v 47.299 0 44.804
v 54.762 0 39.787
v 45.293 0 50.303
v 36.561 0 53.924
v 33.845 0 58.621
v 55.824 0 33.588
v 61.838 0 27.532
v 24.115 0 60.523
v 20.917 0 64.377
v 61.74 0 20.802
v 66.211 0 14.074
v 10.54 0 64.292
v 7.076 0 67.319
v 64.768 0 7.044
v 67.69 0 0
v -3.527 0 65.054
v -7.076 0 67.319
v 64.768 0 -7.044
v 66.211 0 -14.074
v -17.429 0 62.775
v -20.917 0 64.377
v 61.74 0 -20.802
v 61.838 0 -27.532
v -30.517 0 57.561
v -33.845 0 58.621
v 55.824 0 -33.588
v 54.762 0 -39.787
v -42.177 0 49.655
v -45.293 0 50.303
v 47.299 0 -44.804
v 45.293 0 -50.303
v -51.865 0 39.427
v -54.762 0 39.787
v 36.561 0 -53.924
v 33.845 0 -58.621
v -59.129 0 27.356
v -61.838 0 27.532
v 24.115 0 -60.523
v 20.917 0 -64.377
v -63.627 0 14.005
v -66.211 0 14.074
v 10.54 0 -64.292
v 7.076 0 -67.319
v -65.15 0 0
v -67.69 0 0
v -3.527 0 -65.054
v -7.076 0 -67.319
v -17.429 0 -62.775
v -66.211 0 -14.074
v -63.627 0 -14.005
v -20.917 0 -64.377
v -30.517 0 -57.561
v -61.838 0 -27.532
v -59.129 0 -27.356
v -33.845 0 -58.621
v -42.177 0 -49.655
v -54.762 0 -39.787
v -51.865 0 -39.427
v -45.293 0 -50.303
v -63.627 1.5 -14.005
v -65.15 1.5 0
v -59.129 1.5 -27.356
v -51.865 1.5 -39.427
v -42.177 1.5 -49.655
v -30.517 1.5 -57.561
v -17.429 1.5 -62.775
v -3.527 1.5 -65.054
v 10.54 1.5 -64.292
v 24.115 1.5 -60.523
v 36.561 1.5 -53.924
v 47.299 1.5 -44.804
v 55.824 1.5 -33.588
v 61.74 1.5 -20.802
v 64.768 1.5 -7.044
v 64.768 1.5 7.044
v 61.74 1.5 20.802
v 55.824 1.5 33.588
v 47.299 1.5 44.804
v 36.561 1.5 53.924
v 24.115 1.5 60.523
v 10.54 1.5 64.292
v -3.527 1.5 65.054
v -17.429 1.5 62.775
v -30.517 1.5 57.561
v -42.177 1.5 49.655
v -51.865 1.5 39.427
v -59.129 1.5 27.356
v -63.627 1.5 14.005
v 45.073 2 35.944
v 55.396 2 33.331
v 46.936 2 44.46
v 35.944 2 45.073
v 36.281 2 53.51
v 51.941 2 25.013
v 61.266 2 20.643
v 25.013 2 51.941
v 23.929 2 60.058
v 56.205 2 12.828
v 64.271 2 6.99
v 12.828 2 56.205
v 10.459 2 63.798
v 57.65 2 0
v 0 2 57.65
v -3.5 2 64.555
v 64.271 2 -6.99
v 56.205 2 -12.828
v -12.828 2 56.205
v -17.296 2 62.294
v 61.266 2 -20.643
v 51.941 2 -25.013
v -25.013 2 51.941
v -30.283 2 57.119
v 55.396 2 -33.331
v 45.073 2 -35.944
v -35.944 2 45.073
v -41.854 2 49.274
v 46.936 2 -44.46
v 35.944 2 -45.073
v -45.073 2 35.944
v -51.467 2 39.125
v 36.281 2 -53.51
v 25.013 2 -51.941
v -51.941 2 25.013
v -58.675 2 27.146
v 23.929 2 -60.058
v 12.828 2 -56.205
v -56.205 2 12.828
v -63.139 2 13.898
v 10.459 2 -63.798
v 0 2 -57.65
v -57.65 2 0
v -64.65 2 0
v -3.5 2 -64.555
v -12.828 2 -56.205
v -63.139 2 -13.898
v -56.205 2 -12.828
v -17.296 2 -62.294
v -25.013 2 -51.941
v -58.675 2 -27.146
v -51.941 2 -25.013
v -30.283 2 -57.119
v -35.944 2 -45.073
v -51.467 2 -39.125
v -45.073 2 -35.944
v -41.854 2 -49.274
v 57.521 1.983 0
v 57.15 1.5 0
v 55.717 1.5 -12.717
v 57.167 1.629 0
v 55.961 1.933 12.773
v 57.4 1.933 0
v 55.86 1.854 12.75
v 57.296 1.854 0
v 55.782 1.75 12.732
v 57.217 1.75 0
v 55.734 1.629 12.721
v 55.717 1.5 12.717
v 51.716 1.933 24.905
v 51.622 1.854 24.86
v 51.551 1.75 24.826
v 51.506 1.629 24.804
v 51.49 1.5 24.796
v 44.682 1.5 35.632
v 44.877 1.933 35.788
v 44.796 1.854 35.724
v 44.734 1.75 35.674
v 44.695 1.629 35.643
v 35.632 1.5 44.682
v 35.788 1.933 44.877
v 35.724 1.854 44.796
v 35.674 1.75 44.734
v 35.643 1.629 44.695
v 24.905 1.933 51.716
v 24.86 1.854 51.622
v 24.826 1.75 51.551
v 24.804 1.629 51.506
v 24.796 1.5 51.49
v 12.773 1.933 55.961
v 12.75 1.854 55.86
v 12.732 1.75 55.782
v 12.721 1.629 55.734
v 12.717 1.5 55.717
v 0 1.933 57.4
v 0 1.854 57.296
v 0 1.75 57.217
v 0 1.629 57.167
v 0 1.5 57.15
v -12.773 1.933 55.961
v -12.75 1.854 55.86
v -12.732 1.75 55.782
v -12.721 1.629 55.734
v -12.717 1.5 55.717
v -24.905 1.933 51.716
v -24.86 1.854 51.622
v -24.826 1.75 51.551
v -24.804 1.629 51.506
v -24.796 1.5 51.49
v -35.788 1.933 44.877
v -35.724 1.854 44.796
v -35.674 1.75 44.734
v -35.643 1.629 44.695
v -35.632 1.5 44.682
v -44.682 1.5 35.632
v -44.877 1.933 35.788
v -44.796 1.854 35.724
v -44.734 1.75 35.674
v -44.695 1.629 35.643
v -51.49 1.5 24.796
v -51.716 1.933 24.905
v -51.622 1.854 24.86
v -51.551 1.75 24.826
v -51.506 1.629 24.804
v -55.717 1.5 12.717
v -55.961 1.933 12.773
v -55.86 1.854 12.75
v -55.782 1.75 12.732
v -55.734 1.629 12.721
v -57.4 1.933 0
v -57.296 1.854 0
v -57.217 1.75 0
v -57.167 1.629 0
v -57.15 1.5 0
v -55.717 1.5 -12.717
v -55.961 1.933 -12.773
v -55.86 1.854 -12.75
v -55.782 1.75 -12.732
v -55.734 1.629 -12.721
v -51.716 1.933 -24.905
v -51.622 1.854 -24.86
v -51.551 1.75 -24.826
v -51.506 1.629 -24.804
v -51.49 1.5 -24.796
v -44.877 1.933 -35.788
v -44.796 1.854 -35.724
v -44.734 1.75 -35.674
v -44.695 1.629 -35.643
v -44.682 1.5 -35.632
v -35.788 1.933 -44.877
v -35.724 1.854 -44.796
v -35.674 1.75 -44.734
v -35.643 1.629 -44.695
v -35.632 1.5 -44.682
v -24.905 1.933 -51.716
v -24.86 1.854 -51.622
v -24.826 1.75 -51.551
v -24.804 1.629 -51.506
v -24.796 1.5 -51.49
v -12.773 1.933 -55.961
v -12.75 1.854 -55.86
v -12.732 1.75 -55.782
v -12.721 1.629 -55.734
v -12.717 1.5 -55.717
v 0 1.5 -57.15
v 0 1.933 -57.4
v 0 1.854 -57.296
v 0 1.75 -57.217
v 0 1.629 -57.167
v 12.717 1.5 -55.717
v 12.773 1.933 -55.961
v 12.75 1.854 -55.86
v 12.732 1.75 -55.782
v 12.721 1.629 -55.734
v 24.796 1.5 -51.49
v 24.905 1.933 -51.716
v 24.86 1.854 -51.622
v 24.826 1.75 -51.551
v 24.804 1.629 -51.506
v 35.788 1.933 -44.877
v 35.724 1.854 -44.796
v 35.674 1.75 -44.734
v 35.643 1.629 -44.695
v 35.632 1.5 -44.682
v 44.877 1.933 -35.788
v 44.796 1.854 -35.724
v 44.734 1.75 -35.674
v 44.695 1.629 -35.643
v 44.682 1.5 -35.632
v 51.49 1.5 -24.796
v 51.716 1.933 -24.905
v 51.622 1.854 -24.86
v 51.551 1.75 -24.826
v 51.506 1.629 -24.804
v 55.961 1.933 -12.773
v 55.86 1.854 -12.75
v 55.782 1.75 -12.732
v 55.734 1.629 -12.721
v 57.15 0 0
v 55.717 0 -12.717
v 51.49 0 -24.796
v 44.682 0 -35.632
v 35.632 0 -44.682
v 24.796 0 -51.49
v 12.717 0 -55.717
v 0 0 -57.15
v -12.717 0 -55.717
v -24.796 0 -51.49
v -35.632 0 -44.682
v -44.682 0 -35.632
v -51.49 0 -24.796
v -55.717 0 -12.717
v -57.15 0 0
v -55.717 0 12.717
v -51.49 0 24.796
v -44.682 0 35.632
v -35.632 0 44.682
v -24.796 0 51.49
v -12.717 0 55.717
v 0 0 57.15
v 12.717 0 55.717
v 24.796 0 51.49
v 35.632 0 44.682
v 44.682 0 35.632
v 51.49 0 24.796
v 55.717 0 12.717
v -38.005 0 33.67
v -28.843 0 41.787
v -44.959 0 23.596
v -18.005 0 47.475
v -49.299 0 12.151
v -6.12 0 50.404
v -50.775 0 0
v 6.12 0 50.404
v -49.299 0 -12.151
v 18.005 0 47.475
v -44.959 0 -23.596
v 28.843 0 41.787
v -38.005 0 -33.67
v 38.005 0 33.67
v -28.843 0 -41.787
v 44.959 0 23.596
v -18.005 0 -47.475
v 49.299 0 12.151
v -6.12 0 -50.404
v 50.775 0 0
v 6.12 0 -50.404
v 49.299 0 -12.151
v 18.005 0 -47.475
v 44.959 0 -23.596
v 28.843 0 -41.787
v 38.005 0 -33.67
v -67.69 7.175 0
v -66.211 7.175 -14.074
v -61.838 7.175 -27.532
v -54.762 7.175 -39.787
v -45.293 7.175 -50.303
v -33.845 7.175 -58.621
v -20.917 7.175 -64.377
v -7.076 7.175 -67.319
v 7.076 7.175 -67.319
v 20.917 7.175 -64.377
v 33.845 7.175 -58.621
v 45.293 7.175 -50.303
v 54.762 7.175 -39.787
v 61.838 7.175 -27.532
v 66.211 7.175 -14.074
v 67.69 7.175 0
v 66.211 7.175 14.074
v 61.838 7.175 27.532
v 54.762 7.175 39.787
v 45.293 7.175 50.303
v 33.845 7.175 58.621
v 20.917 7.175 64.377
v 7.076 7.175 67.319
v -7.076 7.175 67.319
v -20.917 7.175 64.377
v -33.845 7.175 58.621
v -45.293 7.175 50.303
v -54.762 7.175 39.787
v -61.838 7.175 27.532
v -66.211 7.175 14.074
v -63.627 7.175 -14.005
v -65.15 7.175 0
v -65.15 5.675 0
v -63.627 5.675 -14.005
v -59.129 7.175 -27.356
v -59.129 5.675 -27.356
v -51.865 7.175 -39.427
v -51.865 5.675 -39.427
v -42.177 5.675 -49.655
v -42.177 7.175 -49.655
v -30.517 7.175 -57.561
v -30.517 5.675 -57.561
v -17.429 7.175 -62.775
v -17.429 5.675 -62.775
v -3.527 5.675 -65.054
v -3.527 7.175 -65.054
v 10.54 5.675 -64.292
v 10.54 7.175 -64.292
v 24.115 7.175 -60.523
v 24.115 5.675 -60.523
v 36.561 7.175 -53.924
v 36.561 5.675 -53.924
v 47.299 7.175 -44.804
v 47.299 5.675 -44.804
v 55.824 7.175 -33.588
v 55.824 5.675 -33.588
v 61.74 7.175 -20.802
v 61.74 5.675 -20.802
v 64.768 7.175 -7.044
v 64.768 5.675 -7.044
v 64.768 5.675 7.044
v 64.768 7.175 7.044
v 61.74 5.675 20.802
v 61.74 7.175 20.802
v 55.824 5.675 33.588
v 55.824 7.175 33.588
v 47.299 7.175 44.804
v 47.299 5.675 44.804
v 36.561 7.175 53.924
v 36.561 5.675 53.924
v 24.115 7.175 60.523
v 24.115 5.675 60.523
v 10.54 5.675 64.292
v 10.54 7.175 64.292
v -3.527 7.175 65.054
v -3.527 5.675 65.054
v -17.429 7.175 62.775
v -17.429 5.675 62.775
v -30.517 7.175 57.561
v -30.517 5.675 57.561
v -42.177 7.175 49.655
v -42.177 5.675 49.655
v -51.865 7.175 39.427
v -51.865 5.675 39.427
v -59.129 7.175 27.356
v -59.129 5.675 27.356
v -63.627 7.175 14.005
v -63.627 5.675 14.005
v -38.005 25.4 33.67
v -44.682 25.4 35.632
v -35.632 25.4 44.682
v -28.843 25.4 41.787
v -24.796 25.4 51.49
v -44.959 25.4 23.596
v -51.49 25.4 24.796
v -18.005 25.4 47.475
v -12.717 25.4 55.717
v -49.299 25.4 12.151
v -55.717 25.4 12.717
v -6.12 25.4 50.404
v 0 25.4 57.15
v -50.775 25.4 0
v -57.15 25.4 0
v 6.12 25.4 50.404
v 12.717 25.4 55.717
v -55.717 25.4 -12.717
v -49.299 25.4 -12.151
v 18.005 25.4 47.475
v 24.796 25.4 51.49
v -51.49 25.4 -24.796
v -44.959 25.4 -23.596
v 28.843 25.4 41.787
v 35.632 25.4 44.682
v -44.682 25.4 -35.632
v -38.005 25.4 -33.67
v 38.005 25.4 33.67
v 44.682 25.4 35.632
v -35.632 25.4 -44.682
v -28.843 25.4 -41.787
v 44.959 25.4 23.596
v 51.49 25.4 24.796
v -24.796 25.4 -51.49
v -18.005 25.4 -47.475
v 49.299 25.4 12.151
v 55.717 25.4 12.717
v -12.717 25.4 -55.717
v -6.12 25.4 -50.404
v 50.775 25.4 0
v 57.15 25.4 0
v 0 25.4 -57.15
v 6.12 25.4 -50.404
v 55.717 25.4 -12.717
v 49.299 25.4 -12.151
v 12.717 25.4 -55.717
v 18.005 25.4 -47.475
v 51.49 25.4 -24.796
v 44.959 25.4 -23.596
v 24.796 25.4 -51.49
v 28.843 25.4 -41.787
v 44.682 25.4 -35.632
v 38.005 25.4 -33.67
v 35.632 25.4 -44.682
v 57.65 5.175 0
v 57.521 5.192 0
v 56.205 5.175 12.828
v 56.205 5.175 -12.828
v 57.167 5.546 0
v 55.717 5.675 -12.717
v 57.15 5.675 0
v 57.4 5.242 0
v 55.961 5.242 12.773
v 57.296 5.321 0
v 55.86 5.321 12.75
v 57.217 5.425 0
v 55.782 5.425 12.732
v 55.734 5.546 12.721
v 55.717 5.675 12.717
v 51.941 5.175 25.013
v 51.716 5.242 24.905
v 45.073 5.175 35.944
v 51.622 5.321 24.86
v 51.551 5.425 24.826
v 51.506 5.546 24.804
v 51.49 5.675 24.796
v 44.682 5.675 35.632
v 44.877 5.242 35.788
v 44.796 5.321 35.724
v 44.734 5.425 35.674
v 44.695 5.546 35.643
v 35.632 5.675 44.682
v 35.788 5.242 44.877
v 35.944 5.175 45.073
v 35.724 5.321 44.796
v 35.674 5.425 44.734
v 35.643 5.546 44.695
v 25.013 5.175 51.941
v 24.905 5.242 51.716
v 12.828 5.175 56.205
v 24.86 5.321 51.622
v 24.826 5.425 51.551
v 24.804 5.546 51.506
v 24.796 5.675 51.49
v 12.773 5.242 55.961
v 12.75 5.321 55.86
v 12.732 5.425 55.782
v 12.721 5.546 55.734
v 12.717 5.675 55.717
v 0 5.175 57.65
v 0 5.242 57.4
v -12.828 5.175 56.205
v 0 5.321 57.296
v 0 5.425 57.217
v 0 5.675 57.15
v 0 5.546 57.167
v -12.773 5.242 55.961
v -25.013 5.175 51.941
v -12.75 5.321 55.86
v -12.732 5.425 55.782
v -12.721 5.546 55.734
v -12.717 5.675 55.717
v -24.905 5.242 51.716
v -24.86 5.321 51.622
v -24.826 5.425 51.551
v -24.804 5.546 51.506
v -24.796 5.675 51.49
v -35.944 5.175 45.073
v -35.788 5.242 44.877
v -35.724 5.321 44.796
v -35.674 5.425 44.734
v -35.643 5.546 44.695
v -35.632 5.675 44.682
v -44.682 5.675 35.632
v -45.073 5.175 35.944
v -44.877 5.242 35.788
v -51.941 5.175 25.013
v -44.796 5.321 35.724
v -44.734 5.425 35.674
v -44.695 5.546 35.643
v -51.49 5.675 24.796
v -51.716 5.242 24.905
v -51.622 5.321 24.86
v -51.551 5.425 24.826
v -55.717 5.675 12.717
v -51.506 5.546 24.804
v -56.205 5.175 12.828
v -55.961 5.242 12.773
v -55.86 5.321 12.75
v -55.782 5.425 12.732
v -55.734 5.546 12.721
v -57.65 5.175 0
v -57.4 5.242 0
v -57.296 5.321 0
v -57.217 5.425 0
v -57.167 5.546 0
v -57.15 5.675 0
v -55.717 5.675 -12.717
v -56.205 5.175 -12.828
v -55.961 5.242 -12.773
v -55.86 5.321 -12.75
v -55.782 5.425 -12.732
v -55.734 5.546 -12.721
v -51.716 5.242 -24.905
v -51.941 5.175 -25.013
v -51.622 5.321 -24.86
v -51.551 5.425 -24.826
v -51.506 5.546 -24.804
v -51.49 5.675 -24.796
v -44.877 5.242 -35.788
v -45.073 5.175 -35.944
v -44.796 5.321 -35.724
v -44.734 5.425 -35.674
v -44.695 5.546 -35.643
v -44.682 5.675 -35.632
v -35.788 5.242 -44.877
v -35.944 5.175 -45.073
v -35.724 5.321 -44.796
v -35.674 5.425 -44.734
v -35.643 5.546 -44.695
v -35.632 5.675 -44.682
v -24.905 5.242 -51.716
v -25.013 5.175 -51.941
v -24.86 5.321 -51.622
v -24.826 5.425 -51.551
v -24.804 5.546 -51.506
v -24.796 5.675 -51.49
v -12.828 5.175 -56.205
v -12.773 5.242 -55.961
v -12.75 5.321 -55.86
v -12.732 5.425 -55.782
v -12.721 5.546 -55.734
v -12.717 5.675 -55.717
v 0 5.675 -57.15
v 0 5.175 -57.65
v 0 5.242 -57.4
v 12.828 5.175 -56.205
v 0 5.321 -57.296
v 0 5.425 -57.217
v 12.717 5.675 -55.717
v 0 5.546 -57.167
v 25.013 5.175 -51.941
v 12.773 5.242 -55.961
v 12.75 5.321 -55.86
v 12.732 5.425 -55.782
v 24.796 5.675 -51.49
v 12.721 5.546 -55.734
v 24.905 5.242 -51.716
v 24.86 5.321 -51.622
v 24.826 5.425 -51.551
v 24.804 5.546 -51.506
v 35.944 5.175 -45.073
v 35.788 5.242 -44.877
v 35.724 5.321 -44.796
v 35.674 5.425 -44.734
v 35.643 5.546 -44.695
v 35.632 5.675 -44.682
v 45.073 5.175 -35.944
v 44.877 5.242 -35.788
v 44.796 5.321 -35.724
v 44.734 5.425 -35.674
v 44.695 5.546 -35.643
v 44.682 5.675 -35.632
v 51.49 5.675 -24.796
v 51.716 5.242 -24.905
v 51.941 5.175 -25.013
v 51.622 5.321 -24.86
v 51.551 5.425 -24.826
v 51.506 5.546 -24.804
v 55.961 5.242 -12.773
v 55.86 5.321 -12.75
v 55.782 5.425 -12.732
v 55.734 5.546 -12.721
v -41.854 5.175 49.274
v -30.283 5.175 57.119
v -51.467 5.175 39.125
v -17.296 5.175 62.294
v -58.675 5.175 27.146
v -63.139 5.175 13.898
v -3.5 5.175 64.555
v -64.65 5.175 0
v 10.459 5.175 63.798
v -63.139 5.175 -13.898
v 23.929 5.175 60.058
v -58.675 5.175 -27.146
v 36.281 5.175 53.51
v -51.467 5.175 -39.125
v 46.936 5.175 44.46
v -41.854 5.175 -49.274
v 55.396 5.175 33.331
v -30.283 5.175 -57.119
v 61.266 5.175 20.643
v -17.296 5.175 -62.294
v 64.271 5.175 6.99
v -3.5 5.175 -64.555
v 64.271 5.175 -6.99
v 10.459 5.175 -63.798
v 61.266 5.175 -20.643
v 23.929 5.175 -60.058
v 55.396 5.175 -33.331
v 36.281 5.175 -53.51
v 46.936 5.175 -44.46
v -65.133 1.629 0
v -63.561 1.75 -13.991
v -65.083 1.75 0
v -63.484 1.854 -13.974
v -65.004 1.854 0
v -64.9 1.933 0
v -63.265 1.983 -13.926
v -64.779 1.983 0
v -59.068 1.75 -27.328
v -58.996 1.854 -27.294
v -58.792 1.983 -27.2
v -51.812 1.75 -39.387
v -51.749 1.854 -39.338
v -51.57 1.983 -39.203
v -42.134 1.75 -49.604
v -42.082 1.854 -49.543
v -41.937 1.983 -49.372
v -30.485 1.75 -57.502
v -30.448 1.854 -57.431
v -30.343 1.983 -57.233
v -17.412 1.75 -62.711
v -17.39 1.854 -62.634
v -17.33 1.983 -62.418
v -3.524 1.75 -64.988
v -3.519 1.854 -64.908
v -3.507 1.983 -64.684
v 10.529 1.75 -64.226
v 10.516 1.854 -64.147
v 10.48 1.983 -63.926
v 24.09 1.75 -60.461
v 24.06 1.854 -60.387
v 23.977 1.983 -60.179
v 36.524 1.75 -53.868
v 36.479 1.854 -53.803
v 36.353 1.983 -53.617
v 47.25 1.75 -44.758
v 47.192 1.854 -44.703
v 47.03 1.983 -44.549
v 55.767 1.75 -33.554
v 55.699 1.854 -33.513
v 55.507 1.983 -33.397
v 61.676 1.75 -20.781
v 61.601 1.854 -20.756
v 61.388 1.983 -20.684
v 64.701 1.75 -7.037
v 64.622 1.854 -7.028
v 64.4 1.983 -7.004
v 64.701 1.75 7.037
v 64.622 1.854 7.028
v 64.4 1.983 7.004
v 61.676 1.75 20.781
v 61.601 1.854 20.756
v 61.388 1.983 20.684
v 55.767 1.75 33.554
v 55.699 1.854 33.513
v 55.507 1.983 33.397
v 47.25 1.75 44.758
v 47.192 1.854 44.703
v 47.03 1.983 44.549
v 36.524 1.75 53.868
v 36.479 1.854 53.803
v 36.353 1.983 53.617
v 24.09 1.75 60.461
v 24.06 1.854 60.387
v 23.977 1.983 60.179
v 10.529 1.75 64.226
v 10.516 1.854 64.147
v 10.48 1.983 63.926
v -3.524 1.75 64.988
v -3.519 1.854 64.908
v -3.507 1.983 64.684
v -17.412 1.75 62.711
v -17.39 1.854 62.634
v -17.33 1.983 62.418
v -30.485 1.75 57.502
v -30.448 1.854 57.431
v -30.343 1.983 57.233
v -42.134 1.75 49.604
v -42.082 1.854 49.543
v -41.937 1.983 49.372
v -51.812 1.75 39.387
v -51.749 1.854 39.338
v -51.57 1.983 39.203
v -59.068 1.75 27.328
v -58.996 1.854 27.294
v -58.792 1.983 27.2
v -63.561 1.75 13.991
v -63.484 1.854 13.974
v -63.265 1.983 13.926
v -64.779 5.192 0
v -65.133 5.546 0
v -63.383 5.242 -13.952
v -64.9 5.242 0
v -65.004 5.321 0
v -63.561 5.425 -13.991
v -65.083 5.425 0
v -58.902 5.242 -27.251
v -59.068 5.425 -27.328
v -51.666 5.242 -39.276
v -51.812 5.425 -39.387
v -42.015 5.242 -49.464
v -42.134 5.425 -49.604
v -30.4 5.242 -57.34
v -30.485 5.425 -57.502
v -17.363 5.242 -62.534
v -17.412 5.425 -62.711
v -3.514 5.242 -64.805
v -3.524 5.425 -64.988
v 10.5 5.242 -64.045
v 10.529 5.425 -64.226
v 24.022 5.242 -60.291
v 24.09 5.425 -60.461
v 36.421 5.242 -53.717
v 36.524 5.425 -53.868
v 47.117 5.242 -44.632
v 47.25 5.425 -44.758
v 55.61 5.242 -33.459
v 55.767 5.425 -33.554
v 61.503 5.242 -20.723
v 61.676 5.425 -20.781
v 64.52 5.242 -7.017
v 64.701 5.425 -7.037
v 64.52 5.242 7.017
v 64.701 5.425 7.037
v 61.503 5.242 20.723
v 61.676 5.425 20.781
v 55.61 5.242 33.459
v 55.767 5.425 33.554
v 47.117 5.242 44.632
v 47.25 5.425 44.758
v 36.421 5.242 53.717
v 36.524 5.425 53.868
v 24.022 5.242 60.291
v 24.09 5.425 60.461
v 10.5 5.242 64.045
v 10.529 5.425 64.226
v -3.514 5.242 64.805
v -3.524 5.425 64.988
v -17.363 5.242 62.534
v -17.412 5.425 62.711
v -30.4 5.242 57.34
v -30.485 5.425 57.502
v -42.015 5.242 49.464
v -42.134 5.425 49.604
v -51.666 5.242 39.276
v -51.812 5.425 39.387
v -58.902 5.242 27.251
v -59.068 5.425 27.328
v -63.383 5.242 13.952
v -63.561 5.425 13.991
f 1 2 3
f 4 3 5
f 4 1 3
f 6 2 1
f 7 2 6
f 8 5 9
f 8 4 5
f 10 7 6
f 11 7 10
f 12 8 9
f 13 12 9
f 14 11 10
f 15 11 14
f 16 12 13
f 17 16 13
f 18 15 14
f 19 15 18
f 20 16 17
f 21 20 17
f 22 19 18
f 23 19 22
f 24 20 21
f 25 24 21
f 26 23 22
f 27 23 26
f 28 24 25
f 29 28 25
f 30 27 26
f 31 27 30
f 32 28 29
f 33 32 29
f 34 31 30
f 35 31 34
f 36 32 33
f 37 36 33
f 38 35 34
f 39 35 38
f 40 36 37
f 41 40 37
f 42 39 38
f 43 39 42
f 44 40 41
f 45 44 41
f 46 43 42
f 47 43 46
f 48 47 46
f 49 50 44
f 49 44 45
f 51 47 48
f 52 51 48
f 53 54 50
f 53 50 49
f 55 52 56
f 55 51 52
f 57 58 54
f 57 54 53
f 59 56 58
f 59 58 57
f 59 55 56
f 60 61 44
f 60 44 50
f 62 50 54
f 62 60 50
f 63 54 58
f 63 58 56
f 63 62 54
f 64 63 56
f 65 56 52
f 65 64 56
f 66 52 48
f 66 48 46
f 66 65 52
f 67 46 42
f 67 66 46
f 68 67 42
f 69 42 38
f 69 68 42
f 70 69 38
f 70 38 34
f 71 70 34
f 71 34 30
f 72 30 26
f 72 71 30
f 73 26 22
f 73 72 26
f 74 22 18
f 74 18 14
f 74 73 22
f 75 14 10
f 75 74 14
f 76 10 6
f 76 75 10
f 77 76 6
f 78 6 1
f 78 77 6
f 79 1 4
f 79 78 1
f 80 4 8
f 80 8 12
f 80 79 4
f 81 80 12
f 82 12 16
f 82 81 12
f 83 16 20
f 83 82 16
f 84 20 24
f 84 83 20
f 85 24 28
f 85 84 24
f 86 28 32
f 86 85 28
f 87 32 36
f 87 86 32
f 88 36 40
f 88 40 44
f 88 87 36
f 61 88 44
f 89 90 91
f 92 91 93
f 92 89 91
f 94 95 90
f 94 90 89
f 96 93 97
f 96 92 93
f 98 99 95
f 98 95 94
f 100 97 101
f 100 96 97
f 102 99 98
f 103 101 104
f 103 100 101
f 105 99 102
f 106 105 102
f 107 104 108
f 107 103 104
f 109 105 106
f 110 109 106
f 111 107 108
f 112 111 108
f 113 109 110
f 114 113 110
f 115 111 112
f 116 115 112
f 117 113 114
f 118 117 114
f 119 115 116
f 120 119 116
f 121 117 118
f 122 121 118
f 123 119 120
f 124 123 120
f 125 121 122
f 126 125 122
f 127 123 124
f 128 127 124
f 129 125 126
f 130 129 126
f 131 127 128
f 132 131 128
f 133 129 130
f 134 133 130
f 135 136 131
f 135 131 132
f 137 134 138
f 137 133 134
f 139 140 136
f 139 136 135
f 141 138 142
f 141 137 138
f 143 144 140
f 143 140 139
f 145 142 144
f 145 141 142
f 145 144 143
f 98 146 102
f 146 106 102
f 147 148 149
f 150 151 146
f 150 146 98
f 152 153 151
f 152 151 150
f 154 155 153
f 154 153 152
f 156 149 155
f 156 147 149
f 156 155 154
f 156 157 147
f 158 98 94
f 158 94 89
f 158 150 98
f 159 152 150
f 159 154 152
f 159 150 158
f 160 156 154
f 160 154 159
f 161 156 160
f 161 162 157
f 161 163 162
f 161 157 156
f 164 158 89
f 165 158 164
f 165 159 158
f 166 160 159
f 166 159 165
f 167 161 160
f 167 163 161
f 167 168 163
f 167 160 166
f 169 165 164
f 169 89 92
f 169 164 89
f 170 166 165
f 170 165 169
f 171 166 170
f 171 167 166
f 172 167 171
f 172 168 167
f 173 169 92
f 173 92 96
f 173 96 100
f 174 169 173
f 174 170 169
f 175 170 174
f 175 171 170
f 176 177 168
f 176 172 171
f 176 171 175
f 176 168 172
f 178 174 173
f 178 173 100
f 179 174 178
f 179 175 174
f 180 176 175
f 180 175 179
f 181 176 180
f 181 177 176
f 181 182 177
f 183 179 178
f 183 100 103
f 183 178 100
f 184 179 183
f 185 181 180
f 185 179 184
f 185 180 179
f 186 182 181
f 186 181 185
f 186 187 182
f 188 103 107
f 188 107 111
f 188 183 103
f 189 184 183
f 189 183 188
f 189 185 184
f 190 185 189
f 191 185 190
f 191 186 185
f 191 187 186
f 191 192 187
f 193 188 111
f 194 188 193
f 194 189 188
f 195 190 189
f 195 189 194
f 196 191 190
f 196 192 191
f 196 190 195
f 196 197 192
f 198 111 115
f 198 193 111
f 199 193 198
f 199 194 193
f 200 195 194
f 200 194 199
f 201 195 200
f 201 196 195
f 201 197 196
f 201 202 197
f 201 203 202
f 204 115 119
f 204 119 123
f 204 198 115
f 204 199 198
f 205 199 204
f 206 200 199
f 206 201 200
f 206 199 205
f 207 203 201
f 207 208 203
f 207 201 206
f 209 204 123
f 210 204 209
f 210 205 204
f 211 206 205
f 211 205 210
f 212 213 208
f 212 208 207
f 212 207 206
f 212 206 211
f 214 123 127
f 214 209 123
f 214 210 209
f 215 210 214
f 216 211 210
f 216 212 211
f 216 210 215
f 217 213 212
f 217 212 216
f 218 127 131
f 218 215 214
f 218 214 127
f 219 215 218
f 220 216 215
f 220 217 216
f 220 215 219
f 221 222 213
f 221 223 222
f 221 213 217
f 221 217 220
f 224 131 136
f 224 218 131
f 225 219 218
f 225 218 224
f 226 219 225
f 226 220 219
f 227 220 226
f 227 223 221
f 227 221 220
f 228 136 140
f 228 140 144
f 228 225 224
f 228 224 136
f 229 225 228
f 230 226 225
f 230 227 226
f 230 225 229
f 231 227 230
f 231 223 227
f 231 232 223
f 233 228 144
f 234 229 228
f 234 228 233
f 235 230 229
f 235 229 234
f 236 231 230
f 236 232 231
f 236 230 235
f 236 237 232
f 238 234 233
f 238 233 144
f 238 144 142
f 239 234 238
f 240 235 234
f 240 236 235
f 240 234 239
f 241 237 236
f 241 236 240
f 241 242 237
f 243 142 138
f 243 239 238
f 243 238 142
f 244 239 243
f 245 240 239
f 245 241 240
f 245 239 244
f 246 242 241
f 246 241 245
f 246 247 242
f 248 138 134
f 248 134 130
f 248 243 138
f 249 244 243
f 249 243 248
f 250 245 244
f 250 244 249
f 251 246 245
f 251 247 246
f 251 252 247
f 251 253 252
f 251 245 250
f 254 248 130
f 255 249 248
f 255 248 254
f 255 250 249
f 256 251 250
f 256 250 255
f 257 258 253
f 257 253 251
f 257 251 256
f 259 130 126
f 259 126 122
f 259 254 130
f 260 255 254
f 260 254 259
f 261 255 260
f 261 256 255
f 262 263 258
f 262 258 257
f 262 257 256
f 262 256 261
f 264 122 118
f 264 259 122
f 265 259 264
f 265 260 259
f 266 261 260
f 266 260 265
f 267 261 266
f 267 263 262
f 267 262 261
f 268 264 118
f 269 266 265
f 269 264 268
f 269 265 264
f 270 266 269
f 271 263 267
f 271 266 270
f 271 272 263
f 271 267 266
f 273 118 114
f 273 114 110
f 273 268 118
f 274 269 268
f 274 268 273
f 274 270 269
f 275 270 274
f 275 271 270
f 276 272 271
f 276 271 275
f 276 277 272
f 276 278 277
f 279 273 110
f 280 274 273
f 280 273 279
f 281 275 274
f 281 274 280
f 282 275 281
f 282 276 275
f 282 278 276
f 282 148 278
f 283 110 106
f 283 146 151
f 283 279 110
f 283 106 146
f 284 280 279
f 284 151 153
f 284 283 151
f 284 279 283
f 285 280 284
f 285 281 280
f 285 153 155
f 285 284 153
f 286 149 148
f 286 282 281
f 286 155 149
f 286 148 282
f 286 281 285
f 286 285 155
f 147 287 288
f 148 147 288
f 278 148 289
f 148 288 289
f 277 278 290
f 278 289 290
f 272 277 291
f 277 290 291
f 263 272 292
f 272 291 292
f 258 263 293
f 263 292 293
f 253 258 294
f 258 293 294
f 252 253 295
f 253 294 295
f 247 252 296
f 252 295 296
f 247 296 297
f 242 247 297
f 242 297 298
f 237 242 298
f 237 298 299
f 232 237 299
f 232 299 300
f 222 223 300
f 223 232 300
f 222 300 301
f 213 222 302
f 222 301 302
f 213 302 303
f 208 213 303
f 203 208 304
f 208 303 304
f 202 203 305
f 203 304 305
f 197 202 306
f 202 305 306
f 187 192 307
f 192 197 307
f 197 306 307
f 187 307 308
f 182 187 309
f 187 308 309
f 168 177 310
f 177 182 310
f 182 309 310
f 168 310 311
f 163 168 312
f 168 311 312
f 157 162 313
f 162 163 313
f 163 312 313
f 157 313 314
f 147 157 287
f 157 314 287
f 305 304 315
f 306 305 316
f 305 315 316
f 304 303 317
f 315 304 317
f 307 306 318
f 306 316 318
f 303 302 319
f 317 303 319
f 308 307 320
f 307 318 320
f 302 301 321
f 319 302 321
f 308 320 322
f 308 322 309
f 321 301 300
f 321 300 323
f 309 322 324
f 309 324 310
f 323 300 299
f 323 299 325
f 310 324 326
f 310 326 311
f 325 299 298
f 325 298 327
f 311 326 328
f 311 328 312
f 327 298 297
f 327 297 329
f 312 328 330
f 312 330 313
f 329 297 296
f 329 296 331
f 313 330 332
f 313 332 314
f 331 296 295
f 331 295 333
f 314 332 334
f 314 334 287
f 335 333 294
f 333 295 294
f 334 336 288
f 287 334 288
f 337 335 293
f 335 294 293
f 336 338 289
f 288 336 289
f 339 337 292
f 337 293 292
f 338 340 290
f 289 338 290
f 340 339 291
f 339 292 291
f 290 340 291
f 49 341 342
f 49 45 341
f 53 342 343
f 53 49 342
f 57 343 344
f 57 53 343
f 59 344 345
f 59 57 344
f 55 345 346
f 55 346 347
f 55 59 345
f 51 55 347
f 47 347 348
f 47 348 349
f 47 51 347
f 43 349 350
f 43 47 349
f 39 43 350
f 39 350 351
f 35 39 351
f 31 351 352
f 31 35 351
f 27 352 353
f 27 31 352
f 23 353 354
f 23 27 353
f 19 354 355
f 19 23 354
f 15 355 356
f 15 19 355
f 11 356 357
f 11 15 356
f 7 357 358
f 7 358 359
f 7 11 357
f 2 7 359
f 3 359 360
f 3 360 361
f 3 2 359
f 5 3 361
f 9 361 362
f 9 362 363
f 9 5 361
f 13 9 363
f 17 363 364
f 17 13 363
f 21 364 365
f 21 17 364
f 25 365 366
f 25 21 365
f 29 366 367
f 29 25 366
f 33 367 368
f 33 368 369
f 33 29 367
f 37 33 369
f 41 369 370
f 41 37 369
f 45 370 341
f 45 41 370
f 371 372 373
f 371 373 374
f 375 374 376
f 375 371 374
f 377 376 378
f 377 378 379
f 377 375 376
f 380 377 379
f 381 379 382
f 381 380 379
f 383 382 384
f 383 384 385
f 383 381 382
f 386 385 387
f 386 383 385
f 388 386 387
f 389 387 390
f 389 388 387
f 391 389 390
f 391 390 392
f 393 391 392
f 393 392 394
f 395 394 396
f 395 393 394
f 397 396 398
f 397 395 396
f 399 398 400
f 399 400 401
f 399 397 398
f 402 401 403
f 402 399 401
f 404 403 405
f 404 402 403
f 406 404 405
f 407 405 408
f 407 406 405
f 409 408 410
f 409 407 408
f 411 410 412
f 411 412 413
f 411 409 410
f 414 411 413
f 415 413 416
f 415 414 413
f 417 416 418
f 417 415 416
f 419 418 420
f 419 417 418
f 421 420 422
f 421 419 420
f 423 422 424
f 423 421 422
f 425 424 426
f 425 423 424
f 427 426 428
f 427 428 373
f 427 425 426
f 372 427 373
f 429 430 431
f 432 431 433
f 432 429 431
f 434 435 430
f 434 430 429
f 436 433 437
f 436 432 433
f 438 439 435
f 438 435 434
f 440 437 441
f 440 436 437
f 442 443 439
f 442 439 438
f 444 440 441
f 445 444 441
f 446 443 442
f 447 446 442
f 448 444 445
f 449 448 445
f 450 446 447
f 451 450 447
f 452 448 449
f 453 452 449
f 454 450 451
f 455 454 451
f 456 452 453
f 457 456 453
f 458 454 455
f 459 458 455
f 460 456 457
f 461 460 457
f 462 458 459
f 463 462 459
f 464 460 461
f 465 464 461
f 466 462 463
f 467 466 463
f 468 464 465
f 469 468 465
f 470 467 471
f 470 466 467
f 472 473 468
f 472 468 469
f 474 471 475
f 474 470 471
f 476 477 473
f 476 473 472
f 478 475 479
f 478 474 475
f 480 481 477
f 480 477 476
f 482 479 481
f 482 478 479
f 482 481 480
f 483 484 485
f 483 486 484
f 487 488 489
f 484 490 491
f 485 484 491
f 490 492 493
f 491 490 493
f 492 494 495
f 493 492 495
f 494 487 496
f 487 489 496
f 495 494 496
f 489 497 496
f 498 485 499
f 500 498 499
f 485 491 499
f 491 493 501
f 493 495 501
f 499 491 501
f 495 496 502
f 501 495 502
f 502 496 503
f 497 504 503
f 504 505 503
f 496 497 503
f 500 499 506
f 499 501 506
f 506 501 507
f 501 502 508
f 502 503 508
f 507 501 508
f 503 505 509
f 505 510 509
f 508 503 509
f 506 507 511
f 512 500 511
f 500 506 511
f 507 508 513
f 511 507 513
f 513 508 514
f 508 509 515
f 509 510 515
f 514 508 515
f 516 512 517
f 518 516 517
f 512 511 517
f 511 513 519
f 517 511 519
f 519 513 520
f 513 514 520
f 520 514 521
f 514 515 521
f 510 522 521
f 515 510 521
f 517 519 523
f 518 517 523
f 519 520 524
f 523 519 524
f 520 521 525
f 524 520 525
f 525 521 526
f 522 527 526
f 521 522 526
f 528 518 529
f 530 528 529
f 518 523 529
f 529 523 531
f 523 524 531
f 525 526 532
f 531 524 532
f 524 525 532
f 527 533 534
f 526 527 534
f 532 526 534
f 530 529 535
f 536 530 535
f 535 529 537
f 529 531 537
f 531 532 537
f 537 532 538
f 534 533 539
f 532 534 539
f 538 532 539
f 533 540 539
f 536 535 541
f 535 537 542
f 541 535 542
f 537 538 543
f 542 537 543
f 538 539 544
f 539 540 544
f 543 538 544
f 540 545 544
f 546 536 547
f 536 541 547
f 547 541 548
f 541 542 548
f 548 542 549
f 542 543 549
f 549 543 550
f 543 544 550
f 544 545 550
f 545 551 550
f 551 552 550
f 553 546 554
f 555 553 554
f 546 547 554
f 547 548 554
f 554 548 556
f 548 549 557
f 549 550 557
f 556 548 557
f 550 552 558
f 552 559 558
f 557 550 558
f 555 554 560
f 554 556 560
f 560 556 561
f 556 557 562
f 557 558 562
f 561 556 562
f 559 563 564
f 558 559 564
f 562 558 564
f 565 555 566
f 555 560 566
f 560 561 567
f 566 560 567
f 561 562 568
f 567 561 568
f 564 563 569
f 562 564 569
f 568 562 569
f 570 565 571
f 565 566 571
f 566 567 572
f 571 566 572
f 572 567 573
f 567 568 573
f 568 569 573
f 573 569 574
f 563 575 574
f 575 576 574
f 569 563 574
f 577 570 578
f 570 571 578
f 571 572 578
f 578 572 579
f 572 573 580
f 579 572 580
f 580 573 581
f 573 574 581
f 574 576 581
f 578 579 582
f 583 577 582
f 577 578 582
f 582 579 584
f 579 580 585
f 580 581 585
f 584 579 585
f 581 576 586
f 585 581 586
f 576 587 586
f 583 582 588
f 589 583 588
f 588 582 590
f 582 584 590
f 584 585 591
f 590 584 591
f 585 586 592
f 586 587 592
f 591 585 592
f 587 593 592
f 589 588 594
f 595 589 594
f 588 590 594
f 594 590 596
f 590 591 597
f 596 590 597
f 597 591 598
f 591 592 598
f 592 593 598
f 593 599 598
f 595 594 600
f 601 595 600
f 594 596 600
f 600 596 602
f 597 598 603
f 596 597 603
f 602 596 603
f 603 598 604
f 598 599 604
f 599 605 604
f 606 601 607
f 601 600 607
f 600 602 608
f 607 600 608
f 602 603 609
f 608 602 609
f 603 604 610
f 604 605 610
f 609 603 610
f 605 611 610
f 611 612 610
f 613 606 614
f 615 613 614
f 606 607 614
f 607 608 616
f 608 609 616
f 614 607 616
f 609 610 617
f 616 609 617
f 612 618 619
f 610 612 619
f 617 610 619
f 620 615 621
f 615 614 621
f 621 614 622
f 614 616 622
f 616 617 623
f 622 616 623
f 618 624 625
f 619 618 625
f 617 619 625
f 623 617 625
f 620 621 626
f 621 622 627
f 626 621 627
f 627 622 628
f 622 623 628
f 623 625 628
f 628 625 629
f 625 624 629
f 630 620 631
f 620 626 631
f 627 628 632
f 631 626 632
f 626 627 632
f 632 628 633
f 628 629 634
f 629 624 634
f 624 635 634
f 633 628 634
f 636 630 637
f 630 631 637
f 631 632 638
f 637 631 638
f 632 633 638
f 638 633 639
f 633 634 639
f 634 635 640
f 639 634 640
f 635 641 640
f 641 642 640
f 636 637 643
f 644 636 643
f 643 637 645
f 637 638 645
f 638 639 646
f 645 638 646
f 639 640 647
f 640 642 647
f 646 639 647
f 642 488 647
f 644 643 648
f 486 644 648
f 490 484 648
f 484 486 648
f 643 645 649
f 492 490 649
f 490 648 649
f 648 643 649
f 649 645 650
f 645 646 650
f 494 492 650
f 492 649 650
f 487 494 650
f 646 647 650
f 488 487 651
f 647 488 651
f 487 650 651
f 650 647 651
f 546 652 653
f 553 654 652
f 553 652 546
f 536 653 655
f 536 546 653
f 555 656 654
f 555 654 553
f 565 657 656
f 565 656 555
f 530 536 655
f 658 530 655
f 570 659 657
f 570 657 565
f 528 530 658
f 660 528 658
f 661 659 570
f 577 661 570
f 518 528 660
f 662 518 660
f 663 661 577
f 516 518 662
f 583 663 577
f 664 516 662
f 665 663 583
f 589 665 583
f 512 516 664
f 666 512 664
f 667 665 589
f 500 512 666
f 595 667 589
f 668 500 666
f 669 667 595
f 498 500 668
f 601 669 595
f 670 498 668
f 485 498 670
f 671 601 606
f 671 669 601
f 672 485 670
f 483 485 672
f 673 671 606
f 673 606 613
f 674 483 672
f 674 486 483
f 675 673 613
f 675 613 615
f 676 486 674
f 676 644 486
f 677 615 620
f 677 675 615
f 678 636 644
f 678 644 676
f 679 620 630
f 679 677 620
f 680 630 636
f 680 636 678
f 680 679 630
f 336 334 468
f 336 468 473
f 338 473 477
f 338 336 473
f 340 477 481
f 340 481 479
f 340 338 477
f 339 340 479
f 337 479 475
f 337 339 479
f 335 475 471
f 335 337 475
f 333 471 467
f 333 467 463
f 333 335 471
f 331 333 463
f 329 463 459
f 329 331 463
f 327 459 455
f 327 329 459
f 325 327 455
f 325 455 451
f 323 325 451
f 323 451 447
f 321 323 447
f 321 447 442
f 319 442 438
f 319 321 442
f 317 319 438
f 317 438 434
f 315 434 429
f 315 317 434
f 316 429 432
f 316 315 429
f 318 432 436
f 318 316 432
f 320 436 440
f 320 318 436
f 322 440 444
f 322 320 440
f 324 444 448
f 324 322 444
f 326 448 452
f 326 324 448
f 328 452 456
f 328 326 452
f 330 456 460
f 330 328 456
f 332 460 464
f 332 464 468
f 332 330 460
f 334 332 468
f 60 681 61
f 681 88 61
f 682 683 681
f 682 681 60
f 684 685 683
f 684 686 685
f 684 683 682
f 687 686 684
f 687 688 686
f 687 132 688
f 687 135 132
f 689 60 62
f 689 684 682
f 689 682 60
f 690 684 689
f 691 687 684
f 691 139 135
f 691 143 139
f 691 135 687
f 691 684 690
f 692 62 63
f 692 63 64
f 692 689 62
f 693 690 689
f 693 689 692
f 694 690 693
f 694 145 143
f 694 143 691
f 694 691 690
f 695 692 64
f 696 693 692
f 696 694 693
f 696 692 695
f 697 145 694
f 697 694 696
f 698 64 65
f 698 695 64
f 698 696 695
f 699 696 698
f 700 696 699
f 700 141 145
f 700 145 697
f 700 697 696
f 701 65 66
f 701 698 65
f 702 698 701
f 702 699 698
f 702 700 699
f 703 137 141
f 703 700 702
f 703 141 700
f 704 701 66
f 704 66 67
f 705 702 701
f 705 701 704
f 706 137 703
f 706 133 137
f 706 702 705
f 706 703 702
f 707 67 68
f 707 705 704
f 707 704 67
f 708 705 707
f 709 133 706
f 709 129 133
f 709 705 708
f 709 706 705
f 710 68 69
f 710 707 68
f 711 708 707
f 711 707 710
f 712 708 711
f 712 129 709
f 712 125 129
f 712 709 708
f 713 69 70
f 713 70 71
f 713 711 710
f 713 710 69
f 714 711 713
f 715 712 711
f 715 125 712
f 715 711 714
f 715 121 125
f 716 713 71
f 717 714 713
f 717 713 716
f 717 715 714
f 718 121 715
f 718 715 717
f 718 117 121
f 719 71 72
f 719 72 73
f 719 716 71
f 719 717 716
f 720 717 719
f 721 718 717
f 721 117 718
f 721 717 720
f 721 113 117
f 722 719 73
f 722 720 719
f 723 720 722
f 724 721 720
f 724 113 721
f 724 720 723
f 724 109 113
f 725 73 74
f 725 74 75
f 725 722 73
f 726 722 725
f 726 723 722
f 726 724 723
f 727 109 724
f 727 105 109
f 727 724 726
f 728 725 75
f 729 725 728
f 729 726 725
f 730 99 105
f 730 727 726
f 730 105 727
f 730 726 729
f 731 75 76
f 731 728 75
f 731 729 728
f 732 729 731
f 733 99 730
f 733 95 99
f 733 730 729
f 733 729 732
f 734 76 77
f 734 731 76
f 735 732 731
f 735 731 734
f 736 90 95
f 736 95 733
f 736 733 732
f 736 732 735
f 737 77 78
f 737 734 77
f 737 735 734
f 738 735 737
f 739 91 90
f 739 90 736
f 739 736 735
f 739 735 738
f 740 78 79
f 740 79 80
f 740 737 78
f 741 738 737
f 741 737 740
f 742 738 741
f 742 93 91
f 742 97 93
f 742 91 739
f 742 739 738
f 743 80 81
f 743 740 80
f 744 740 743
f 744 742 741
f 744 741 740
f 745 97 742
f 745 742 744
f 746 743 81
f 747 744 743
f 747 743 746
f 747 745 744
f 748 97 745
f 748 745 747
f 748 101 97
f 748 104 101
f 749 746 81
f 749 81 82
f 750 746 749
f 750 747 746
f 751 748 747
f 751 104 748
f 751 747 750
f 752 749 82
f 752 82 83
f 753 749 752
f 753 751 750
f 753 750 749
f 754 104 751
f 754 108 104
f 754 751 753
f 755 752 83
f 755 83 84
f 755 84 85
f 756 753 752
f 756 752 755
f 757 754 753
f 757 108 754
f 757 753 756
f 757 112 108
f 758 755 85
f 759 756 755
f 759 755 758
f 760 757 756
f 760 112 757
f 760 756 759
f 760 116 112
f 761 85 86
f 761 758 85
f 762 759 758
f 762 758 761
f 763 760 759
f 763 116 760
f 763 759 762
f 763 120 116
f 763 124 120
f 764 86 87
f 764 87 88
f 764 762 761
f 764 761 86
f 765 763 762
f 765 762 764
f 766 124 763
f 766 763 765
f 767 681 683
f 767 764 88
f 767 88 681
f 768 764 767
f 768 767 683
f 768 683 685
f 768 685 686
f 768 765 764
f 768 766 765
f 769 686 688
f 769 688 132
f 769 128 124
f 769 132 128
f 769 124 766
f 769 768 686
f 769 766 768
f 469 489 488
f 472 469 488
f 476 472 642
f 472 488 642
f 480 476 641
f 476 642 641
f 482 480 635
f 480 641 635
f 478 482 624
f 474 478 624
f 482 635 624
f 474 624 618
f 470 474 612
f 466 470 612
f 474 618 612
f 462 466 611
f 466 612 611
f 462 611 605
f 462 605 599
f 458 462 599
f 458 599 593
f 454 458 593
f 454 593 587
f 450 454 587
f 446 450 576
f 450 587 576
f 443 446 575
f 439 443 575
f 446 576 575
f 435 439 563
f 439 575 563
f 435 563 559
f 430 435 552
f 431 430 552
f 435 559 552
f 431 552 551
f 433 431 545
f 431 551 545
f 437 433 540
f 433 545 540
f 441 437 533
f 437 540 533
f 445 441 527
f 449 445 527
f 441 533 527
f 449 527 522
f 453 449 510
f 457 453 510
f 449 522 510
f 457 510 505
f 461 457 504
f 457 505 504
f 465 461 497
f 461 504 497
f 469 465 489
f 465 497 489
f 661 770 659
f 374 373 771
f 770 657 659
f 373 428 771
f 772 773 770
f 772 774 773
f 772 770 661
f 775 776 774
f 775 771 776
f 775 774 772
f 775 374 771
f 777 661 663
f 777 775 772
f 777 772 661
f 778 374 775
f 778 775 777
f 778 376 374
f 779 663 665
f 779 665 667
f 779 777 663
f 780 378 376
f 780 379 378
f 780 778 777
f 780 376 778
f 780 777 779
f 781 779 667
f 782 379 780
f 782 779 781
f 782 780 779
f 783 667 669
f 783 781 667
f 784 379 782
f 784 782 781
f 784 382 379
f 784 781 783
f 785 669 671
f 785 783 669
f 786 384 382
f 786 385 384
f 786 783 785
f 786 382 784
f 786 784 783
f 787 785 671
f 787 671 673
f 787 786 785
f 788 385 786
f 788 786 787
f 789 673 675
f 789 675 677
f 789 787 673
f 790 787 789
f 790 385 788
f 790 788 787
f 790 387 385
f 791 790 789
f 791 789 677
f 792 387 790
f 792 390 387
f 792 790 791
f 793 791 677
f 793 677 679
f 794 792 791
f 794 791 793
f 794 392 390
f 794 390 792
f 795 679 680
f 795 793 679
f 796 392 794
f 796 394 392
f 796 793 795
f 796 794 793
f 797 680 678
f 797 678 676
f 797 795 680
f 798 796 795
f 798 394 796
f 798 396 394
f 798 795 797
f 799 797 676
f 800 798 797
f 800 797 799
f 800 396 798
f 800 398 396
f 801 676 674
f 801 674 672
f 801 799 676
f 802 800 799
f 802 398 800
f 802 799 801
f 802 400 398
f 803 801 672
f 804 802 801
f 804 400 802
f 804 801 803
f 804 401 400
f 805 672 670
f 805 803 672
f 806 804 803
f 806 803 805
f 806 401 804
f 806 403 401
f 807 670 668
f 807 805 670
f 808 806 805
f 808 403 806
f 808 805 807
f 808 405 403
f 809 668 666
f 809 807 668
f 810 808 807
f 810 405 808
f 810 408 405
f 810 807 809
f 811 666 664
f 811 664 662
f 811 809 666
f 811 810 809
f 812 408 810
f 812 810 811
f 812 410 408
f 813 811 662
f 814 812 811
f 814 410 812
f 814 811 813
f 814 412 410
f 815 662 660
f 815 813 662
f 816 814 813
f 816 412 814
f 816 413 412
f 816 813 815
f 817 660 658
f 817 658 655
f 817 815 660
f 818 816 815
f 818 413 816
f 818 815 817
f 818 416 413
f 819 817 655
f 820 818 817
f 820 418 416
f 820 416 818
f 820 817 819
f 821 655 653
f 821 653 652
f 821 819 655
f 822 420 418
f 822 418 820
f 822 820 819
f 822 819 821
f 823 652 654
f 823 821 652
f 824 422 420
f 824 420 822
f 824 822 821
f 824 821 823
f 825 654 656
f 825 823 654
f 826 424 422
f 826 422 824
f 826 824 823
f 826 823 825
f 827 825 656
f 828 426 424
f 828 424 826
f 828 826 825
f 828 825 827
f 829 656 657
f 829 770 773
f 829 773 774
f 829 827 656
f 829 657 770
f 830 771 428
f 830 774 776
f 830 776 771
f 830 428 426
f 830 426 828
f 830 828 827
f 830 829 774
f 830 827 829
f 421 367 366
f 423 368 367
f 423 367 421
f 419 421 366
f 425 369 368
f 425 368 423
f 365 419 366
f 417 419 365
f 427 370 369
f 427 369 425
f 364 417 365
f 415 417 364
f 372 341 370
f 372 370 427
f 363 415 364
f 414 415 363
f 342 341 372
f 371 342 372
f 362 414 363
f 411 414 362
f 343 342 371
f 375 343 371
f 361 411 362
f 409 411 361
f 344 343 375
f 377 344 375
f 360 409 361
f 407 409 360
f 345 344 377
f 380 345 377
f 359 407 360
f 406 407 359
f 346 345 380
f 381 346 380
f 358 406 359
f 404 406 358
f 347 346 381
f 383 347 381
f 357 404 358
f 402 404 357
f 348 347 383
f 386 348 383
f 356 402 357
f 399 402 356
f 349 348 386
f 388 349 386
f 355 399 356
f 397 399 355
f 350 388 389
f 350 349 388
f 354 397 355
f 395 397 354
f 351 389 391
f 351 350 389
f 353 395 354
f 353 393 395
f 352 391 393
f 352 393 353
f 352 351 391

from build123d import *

# Parameters (mm, degrees)
SKETCH1_R           = 57.15
SKETCH1_R_2         = 50.7746
BOSS_EXTRUDE1_DEPTH = 25.4
FILLET1_R           = 0.5


with BuildPart() as part:
    # Sketch1 → Boss-Extrude1 (new body)
    with BuildSketch(Plane(origin=(0, 0, 0), x_dir=(1, 0, 0), z_dir=(0, 1, 0))):
        Circle(SKETCH1_R)
        Circle(SKETCH1_R_2, mode=Mode.SUBTRACT)
    extrude(amount=BOSS_EXTRUDE1_DEPTH)

    # Sketch2 → Revolve1 (revolve)
    with BuildSketch(Plane.XY):
        Polygon((-57.15, 5.175), (-65.15, 5.175), (-65.15, 7.175), (-67.69, 7.175), (-67.69, 0), (-65.15, 0), (-65.15, 2), (-57.15, 2), align=None)
    revolve(axis=Axis((0, 25.4, 0), (0, -1, 0)))

    # Fillet1
    fillet1_edges = [part.edges().sort_by_distance(p)[0] for p in [
        (-57.15, 5.175, 0),
        (-57.15, 2, 0),
        (65.15, 2, 0),
        (65.15, 5.175, 0),
    ]]
    fillet(fillet1_edges, radius=FILLET1_R)


solid = part.part
